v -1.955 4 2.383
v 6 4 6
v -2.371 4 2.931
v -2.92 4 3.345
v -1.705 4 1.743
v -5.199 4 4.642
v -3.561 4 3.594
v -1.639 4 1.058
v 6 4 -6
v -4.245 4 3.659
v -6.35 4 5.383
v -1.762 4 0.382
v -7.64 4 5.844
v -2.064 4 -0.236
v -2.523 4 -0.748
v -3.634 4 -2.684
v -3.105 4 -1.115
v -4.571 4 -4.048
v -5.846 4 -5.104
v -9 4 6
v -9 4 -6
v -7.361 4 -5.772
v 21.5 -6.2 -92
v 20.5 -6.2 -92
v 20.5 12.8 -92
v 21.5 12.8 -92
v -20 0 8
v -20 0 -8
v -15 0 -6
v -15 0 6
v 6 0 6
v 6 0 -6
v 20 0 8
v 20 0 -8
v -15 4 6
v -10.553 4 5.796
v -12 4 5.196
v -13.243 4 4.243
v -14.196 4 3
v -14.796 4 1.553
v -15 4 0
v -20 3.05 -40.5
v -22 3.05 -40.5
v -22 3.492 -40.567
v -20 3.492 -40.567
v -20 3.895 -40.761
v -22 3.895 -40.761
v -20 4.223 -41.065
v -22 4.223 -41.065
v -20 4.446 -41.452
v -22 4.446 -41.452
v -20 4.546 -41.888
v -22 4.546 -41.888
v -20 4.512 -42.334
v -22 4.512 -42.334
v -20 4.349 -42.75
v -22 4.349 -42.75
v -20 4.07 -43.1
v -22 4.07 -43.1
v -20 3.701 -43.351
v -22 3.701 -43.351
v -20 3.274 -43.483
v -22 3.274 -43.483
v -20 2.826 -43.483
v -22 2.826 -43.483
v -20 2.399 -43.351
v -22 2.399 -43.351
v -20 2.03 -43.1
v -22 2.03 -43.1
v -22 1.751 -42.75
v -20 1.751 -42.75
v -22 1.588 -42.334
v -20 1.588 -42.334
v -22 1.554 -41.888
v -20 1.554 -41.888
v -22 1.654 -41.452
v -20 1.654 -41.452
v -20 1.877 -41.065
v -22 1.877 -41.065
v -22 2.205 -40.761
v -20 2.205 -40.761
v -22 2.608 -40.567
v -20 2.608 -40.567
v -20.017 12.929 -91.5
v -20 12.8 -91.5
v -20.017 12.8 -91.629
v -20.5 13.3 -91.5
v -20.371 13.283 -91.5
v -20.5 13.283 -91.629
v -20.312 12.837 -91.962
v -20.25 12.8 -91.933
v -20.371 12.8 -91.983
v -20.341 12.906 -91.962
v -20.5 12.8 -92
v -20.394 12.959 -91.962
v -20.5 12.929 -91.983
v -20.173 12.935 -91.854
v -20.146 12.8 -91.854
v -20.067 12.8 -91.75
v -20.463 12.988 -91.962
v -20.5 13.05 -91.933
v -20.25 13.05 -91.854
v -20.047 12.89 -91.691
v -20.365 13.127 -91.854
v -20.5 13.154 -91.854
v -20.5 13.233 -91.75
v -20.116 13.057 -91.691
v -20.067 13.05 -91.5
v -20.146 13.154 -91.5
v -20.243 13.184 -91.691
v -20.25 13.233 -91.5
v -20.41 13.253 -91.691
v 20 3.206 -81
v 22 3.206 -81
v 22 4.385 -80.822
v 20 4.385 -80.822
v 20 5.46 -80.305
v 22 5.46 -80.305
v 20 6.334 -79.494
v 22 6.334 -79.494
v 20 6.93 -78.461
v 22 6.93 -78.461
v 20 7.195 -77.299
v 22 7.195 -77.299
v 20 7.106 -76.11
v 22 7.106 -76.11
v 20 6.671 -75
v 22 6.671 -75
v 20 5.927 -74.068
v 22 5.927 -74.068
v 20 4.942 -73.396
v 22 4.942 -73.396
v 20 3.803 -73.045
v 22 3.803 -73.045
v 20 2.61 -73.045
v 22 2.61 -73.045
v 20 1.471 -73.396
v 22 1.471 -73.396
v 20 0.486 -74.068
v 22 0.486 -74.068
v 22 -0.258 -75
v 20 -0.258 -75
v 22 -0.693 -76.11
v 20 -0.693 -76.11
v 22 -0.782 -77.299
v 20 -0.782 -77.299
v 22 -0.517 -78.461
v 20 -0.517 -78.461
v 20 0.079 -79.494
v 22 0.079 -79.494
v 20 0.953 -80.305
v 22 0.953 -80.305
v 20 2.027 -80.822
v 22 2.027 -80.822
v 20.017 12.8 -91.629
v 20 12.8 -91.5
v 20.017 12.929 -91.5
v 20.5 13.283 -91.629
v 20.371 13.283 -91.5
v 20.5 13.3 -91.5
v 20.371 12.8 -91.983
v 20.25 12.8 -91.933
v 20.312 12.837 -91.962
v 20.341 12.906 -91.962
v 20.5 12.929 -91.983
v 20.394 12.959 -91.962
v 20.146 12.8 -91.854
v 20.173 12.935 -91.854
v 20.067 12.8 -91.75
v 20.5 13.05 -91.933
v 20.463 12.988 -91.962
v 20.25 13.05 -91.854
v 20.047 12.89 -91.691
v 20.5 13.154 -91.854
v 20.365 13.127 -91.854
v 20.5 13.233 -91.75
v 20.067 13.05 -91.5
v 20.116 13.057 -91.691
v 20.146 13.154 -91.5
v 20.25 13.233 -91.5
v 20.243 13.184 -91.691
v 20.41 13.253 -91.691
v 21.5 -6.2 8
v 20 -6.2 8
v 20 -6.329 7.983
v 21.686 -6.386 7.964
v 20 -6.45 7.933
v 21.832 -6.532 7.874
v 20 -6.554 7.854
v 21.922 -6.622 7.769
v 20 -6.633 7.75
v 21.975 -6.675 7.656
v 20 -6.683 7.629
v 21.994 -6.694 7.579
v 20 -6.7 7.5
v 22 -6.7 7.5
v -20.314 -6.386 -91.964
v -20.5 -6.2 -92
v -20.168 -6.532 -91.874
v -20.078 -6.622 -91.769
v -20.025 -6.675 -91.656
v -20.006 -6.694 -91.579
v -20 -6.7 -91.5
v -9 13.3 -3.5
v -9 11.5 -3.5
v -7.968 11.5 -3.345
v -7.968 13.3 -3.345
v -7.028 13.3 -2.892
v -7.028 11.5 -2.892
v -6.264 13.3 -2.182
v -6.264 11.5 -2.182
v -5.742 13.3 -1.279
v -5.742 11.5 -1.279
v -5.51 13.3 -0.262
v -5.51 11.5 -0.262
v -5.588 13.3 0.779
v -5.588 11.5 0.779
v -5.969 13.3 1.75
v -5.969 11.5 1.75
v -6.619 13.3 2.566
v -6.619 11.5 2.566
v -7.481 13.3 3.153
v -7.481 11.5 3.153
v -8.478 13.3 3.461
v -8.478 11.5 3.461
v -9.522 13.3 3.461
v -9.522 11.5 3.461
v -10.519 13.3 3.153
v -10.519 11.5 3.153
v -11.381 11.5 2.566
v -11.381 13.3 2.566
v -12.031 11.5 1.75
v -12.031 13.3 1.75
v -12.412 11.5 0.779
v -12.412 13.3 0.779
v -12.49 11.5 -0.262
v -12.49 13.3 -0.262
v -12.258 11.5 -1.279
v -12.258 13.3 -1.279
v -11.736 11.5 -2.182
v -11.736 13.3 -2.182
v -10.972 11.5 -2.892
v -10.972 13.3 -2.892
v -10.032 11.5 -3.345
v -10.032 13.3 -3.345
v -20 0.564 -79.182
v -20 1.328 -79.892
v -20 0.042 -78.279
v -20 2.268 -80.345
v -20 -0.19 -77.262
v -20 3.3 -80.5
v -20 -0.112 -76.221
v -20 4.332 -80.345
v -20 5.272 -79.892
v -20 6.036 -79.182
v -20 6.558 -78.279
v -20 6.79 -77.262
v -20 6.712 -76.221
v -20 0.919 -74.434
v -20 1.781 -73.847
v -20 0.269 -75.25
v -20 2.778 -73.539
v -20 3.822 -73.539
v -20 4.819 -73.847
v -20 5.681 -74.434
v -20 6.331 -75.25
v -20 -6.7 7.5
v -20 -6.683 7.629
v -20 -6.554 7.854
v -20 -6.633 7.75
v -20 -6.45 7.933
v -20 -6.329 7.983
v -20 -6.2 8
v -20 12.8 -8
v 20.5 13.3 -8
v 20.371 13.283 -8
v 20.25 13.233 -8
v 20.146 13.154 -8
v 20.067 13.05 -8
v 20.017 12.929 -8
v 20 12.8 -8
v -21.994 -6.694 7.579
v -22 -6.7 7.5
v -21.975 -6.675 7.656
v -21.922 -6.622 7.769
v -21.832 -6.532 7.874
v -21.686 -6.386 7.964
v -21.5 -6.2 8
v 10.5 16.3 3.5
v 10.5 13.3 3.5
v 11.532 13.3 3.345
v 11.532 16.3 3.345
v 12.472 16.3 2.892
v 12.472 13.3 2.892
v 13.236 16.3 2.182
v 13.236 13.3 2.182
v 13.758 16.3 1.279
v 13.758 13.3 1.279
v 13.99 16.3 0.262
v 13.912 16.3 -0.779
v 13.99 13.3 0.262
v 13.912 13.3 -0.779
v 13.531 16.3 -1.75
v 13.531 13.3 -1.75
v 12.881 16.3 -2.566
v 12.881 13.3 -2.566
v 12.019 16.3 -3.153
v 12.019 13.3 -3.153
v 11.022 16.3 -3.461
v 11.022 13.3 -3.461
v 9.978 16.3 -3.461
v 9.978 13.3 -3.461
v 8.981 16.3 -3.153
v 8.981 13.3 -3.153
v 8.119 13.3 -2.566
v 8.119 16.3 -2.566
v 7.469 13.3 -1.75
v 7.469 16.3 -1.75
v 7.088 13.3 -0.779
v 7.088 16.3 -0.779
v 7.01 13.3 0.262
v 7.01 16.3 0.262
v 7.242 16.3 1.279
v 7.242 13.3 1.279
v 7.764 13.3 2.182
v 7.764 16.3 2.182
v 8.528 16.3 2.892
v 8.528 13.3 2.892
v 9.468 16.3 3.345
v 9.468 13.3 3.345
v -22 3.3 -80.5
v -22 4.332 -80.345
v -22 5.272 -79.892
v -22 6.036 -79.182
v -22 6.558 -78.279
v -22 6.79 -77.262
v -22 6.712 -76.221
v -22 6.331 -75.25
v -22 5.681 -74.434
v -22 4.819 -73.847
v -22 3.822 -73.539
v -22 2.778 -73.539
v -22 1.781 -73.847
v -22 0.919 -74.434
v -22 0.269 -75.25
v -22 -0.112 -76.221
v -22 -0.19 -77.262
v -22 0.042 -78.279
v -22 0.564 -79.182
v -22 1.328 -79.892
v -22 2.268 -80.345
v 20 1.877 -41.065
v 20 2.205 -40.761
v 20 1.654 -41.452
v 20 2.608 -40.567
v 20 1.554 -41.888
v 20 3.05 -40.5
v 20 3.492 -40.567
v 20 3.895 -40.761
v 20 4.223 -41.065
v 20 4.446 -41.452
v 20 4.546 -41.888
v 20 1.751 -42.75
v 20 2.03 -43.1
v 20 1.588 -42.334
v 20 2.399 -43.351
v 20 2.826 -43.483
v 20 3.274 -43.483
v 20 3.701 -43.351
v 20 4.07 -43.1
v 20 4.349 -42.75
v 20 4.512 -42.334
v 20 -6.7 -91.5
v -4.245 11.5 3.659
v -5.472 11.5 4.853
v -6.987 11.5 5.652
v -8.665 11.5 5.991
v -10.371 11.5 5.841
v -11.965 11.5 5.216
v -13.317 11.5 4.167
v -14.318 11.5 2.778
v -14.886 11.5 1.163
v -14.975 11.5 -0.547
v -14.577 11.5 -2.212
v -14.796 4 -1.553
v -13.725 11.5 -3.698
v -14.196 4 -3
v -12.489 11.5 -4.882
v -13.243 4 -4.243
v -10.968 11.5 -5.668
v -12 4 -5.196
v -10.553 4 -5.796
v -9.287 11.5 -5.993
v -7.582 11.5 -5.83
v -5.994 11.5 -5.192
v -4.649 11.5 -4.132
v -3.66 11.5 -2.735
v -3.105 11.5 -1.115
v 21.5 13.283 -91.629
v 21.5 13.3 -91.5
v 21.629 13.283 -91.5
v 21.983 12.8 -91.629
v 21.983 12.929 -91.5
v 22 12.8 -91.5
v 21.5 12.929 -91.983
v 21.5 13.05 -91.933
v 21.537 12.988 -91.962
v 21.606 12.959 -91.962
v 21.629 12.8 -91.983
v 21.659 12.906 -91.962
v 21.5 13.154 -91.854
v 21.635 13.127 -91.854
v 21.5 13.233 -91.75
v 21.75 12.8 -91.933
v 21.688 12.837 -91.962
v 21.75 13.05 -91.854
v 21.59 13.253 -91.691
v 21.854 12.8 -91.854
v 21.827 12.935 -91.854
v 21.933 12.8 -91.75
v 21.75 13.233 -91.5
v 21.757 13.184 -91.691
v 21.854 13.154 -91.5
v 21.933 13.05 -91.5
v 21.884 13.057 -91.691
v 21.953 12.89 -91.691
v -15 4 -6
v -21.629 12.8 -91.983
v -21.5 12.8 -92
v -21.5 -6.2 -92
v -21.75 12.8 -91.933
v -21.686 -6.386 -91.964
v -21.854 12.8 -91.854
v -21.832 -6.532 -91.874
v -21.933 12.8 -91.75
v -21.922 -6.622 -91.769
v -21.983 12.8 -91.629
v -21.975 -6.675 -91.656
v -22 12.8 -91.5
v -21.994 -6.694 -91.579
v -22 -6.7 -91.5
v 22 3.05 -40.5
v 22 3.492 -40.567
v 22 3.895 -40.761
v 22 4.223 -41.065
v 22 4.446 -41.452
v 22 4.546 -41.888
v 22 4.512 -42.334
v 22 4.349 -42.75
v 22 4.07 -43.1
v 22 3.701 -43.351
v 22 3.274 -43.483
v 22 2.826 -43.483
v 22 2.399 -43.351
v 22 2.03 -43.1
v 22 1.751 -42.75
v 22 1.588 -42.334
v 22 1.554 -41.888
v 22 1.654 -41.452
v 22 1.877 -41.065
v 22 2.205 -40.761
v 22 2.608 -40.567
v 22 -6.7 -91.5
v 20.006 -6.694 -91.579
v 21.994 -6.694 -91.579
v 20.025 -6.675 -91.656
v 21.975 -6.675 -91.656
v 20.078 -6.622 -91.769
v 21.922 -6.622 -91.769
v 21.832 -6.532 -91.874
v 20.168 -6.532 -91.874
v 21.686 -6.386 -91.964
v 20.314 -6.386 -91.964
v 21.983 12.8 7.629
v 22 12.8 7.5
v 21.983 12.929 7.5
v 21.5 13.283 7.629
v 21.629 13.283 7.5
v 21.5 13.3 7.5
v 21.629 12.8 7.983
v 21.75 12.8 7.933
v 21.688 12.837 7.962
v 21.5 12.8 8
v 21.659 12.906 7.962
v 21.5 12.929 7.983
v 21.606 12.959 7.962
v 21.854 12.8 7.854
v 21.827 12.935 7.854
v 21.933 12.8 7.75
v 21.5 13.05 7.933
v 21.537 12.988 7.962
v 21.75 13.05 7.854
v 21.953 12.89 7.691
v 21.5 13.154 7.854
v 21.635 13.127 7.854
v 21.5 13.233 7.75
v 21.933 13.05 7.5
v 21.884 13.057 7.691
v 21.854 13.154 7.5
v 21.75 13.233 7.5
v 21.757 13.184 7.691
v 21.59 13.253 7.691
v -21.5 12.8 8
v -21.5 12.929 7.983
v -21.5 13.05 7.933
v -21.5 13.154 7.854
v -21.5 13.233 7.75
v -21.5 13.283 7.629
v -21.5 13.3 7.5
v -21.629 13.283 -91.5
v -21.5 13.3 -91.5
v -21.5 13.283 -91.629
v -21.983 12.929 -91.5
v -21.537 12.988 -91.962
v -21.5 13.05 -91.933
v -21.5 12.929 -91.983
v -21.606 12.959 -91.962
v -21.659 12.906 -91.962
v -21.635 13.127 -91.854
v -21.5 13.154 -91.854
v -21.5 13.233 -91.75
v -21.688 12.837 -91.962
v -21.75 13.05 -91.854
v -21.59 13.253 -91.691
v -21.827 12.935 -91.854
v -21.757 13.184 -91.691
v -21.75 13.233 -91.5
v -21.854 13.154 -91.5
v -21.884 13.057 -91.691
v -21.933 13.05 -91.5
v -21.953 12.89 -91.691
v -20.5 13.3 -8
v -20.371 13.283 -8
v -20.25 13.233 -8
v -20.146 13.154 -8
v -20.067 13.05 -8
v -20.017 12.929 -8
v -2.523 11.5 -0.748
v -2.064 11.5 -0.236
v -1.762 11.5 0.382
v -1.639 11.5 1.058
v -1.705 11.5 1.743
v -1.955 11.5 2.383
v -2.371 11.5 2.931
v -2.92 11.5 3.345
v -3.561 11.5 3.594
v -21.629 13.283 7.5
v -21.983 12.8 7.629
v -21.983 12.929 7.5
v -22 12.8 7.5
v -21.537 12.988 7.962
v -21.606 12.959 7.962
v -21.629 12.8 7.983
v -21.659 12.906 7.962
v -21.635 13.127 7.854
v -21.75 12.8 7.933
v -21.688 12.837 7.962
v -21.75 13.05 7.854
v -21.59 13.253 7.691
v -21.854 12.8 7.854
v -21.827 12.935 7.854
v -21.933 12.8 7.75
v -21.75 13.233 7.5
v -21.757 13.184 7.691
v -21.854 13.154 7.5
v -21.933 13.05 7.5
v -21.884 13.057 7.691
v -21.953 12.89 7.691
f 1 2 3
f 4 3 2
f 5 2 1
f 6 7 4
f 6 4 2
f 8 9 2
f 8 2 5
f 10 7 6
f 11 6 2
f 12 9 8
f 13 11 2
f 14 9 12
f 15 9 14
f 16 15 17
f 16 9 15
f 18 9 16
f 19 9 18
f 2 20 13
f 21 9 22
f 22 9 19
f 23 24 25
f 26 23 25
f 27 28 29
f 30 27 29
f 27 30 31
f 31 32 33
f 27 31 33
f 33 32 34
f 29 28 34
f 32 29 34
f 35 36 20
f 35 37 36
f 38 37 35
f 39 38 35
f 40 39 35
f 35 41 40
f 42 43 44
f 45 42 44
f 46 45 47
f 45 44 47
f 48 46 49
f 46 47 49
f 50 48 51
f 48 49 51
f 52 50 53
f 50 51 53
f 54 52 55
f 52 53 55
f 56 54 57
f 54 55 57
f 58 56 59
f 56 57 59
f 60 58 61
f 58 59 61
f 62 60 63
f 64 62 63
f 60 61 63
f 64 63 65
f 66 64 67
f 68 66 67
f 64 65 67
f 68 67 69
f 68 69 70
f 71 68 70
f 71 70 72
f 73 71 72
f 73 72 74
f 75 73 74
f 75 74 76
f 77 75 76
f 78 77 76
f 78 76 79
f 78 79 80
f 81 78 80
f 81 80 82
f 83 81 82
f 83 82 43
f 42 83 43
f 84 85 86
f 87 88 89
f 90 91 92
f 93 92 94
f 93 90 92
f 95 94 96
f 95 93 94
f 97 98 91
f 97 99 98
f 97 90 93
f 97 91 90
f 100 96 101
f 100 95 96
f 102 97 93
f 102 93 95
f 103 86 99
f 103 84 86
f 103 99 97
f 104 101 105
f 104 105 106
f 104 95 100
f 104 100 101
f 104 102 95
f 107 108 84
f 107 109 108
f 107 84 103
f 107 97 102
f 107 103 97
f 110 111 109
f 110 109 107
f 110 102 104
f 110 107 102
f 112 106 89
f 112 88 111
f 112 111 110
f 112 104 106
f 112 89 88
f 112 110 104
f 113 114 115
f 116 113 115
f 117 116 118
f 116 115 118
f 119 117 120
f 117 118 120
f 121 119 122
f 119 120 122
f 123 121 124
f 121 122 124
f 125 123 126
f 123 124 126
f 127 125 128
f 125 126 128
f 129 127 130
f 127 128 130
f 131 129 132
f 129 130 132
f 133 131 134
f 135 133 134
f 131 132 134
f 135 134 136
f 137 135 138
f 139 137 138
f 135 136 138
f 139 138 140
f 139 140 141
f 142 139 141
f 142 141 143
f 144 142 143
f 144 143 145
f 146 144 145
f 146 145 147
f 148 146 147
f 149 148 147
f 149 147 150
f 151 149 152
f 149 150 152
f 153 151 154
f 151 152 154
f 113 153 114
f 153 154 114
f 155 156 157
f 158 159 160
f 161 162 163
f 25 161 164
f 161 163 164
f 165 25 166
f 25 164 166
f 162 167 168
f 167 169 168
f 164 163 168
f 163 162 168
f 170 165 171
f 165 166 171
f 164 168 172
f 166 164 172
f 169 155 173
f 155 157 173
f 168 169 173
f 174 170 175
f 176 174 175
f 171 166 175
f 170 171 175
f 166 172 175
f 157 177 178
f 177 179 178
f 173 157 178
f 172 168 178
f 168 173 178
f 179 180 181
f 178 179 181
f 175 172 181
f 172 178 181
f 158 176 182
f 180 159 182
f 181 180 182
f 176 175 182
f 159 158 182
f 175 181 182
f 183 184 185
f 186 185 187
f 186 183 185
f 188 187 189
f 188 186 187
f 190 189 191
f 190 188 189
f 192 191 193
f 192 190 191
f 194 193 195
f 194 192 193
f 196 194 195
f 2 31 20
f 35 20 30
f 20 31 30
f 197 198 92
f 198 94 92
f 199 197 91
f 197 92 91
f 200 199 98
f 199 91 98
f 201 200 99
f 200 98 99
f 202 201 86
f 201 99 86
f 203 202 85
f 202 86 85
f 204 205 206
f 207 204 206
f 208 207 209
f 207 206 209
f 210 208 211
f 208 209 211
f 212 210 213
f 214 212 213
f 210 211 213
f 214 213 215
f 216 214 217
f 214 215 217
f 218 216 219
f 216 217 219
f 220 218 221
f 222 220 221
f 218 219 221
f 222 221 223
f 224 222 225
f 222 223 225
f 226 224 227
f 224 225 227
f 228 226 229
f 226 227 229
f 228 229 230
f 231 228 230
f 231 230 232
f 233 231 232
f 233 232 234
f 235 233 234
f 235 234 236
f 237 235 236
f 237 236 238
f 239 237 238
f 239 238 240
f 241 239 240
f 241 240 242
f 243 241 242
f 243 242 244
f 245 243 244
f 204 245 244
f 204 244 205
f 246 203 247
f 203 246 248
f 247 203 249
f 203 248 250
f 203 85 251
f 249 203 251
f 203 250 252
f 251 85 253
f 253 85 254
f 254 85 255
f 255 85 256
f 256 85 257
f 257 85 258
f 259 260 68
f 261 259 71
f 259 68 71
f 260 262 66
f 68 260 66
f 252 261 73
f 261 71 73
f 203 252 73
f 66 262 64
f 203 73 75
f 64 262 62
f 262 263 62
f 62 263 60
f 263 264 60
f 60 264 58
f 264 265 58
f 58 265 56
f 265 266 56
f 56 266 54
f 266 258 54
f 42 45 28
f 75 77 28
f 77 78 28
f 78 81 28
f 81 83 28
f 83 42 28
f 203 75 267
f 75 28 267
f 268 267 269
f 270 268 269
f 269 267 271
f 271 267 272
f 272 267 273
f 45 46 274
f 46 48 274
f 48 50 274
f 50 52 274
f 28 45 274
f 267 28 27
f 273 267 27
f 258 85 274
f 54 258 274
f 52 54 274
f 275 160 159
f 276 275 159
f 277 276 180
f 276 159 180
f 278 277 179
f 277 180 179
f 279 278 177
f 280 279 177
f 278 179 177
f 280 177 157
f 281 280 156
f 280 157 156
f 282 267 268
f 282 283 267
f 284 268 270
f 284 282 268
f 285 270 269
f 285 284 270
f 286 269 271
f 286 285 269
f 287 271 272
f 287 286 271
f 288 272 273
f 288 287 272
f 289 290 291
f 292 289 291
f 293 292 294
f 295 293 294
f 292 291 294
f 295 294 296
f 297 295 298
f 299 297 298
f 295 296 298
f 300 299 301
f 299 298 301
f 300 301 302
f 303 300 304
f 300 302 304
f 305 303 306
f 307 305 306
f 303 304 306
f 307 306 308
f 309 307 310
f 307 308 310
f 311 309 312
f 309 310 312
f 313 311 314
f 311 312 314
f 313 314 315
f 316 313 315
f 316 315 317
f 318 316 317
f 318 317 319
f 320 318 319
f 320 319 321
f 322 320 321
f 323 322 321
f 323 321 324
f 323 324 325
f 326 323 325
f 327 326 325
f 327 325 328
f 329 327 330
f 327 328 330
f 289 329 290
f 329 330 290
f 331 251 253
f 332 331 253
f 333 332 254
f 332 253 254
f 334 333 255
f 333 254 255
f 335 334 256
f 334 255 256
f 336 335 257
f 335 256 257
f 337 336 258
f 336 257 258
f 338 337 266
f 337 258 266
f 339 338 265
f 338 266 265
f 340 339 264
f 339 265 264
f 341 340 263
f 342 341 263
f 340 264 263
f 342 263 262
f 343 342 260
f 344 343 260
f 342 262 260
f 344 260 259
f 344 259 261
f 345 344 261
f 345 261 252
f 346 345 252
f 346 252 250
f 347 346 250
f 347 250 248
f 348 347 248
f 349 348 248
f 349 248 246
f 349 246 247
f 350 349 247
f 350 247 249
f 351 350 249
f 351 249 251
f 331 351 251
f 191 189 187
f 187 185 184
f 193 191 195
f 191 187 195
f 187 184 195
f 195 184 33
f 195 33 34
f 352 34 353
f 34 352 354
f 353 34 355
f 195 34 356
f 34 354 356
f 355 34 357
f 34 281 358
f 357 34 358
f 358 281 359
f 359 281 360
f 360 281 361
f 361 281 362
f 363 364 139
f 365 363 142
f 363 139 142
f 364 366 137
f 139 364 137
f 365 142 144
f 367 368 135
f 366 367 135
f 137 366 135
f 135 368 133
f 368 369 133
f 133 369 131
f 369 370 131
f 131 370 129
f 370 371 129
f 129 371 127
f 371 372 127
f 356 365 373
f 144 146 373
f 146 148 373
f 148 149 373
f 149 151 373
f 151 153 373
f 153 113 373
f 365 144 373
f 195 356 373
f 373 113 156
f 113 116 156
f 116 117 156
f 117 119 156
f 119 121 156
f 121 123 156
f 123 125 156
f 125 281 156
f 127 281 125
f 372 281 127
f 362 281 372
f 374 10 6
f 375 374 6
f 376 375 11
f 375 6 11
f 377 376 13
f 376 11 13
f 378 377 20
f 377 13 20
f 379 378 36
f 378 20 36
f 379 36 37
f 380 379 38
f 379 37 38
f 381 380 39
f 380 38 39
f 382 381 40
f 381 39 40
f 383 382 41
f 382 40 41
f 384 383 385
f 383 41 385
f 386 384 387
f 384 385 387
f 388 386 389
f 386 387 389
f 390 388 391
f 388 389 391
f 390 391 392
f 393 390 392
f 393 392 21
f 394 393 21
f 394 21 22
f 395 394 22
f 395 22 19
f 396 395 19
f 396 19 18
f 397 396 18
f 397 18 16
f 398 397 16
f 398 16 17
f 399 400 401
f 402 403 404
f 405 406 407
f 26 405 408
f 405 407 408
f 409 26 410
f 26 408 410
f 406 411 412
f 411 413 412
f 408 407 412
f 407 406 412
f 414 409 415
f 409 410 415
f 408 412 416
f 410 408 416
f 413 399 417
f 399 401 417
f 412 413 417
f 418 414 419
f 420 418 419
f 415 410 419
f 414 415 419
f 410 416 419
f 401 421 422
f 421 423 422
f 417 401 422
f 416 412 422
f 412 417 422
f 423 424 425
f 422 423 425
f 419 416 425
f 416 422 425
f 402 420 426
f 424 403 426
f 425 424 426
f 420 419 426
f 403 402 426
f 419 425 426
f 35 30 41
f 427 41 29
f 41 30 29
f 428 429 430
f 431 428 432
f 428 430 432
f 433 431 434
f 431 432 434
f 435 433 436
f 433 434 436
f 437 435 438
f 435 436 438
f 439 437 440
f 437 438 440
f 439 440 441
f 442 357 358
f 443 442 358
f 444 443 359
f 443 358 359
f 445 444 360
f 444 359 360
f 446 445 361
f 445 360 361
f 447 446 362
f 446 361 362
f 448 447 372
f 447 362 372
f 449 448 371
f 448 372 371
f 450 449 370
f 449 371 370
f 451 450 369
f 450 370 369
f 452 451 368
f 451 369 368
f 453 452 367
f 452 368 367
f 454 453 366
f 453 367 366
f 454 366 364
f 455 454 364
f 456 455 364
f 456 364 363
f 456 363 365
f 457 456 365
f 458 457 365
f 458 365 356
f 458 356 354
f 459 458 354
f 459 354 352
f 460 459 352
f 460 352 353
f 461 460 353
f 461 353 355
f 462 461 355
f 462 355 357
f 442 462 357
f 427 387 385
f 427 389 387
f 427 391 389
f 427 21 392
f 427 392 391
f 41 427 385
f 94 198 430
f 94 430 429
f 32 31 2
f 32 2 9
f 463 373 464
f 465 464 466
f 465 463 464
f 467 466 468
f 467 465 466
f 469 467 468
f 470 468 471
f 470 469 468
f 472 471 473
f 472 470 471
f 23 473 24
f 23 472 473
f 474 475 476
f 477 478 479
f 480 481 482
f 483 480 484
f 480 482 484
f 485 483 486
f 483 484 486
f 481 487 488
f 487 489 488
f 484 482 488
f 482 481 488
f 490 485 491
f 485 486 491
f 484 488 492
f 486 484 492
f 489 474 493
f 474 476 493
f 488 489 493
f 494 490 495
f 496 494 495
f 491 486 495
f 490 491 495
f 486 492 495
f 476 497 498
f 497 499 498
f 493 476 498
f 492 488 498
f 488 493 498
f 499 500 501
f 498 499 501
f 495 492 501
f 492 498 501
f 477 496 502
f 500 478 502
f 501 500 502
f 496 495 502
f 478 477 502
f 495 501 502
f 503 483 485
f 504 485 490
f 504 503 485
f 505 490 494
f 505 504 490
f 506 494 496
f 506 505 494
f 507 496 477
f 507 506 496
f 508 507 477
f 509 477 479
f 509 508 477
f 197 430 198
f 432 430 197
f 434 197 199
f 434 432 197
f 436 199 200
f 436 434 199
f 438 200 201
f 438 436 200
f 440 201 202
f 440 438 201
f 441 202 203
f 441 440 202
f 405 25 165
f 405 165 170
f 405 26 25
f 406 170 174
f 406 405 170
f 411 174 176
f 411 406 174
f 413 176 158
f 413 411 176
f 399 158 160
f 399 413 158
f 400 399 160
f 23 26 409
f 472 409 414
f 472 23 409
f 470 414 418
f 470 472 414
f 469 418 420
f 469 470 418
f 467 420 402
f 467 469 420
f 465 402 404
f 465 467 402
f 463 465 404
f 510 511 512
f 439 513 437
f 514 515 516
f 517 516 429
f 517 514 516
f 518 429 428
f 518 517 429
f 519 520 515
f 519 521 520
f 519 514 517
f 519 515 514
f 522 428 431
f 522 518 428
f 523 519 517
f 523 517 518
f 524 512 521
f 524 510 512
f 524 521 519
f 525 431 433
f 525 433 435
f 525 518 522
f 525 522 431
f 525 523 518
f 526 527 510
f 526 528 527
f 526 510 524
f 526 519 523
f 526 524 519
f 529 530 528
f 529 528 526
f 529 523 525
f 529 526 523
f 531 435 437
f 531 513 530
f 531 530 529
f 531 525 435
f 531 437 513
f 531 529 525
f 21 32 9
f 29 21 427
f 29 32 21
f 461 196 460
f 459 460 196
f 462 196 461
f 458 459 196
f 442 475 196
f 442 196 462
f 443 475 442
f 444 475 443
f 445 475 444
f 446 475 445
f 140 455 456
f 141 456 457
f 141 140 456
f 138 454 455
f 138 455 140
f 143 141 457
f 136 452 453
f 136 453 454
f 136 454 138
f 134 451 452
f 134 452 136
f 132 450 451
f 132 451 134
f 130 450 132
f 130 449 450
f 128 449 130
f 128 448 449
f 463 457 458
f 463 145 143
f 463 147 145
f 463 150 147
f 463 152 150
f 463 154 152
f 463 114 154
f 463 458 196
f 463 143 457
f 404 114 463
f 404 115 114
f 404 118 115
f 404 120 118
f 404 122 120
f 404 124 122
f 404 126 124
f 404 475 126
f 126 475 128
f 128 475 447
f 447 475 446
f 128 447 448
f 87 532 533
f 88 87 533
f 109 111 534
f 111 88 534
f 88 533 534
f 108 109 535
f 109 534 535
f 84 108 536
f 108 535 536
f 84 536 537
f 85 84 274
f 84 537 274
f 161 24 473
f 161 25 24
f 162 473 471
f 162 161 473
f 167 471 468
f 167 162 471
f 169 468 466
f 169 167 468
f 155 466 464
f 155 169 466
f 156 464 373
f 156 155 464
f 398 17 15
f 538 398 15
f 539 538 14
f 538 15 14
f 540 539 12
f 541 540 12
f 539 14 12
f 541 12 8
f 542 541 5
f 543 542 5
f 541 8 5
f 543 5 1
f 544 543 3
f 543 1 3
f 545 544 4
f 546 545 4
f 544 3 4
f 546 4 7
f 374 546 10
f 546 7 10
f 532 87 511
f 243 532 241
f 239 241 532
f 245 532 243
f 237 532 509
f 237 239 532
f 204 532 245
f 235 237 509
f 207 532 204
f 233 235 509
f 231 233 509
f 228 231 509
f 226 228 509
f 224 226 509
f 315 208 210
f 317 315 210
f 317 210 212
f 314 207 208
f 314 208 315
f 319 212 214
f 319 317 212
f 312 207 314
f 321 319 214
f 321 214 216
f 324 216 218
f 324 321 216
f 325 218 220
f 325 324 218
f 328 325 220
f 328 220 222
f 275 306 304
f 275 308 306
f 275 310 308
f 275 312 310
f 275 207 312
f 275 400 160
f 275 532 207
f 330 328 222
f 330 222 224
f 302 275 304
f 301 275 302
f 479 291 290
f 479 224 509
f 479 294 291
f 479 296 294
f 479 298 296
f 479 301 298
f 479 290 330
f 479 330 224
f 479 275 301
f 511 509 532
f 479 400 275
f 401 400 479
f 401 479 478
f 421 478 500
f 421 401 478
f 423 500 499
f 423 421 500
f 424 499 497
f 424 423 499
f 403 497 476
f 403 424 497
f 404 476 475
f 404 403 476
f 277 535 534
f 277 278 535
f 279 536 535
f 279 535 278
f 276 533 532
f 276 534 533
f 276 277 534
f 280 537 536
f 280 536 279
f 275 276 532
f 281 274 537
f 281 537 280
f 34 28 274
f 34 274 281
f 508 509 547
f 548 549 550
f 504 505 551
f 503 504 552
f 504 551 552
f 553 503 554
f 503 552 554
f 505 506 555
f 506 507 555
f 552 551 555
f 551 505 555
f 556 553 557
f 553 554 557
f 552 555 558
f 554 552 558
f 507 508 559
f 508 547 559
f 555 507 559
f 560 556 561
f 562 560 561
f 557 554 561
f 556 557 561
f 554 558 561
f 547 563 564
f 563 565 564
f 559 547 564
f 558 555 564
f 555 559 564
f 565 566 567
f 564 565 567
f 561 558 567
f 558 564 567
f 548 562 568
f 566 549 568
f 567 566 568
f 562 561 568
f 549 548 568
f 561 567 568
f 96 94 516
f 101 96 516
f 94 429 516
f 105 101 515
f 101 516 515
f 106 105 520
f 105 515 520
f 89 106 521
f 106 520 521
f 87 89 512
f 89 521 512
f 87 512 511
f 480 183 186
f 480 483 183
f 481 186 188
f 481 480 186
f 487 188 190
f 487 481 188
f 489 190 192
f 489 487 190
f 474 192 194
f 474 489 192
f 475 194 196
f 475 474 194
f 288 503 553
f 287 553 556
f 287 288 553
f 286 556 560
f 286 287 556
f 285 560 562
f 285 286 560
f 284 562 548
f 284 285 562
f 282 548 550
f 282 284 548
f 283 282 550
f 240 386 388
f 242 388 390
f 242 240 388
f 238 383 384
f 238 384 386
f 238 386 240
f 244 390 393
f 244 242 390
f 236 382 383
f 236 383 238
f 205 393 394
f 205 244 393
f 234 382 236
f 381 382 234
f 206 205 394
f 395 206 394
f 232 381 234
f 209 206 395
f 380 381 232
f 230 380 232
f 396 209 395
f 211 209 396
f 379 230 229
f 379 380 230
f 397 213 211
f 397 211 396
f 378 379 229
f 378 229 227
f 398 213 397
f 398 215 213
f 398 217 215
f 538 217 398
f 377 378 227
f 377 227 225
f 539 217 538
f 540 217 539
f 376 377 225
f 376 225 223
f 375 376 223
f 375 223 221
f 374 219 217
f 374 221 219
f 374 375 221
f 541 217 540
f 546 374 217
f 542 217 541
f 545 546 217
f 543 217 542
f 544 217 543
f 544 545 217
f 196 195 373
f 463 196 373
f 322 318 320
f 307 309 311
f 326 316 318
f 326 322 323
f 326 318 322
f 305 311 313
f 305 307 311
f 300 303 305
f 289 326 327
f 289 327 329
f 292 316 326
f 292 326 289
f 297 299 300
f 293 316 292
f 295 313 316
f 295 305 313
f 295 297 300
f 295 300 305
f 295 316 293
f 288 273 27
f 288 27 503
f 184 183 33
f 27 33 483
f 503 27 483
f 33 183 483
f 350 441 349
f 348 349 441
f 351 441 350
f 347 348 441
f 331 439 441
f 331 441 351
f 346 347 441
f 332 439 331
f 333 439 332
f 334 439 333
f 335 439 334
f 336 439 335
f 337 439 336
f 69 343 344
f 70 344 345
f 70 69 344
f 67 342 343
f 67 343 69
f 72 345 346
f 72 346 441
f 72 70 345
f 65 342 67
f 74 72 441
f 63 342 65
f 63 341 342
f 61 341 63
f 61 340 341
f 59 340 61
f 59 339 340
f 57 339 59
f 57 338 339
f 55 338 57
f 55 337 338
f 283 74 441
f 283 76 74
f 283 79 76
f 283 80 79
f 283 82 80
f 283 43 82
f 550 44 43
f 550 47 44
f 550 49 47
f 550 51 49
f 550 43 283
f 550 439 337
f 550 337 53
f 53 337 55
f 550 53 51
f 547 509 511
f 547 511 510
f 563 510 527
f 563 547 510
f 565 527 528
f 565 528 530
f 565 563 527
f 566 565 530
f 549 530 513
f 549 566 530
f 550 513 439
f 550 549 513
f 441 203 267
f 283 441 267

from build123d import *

# Parameters (mm, degrees)
SKETCH1_W           = 40
SKETCH1_H           = 16
BOSS_EXTRUDE1_DEPTH = 13.3
CUT_EXTRUDE2_DEPTH  = 11.5
SKETCH3_R           = 3.5
CUT_EXTRUDE3_DEPTH  = 24.8
SKETCH4_W           = 21
SKETCH4_H           = 12
CUT_EXTRUDE4_DEPTH  = 4
SKETCH5_W           = 100
SKETCH5_H           = 20
BOSS_EXTRUDE2_DEPTH = 2
SKETCH6_W           = 100
SKETCH6_H           = 20
BOSS_EXTRUDE3_DEPTH = 2
SKETCH7_R           = 4
CUT_EXTRUDE5_DEPTH  = 2
CUT_EXTRUDE8_REACH  = 104.004
SKETCH8_R           = 3.5
FILLET1_R           = 0.5
FILLET2_R           = 0.5
SKETCH9_R           = 3.5
BOSS_EXTRUDE4_DEPTH = 3
SKETCH10_R          = 1.5
CUT_EXTRUDE9_DEPTH  = 104.274827523


with BuildPart() as part:
    # Sketch1 → Boss-Extrude1 (new body)
    with BuildSketch(Plane(origin=(0, 0, 0), x_dir=(1, 0, 0), z_dir=(0, 1, 0))):
        Rectangle(SKETCH1_W, SKETCH1_H)
    extrude(amount=BOSS_EXTRUDE1_DEPTH)

    # Sketch2 → Cut-Extrude2 (cut)
    with BuildSketch(Plane.XZ):
        with BuildLine():
            ThreePointArc((-4.245094519, 3.659354296), (-14.835807847, -1.394039732), (-3.104556161, -1.115231786))
            ThreePointArc((-3.104556161, -1.115231786), (-1.705240191, 1.742549665), (-4.245094519, 3.659354296))
        make_face()
    extrude(amount=-CUT_EXTRUDE2_DEPTH, mode=Mode.SUBTRACT)

    # Sketch3 → Cut-Extrude3 (cut)
    with BuildSketch(Plane(origin=(0, 0, 0), x_dir=(-1, 0, 0), z_dir=(0, -1, 0))):
        with Locations(Location((9, 0, 0), (0, 0, 90))):
            Circle(SKETCH3_R)
    extrude(amount=-CUT_EXTRUDE3_DEPTH, mode=Mode.SUBTRACT)

    # Sketch4 → Cut-Extrude4 (cut)
    with BuildSketch(Plane(origin=(0, 0, 0), x_dir=(-1, 0, 0), z_dir=(0, -1, 0))):
        with Locations((4.5, 0)):
            Rectangle(SKETCH4_W, SKETCH4_H)
    extrude(amount=-CUT_EXTRUDE4_DEPTH, mode=Mode.SUBTRACT)

    # Sketch5 → Boss-Extrude2 (add)
    with BuildSketch(Plane(origin=(20, 0, 0), x_dir=(0, 0, -1), z_dir=(1, 0, 0))):
        with Locations((42, 3.3)):
            Rectangle(SKETCH5_W, SKETCH5_H)
    extrude(amount=BOSS_EXTRUDE2_DEPTH)

    # Sketch6 → Boss-Extrude3 (add)
    with BuildSketch(Plane.ZY.offset(20)):
        with Locations((-42, 3.3)):
            Rectangle(SKETCH6_W, SKETCH6_H)
    extrude(amount=BOSS_EXTRUDE3_DEPTH)

    # Sketch7 → Cut-Extrude5 (cut)
    with BuildSketch(Plane(origin=(22, 0, 0), x_dir=(0, 0, -1), z_dir=(1, 0, 0))):
        with Locations((77, 3.206448438)):
            Circle(SKETCH7_R)
    extrude(amount=-CUT_EXTRUDE5_DEPTH, mode=Mode.SUBTRACT)

    # Sketch8 → Cut-Extrude8 (cut, up to next)
    with BuildSketch(Plane(origin=(-20, 0, 0), x_dir=(0, 0, -1), z_dir=(1, 0, 0)), mode=Mode.PRIVATE) as cut_extrude8_sk1:
        with Locations((77, 3.3)):
            Circle(SKETCH8_R)
    cut_extrude8_tool1 = extrude(cut_extrude8_sk1.sketch, amount=-CUT_EXTRUDE8_REACH, mode=Mode.PRIVATE) & part.part
    add(cut_extrude8_tool1.solids().sort_by_distance((-20, 3.3, -77))[0], mode=Mode.SUBTRACT)

    # Fillet1
    fillet1_edges = [part.edges().sort_by_distance(p)[0] for p in [
        (20, 13.3, -50),
        (22, 13.3, -42),
        (-20, 13.3, -50),
        (-22, 13.3, -42),
    ]]
    fillet(fillet1_edges, radius=FILLET1_R)

    # Fillet2
    fillet2_edges = [part.edges().sort_by_distance(p)[0] for p in [
        (21.853553391, 13.153553391, -92),
        (20.146446609, 13.153553391, -92),
        (-20, 3.05, -92),
        (-22, 3.05, -92),
        (-21.853553391, 13.153553391, -92),
        (-20.146446609, 13.153553391, -92),
        (22, 3.05, 8),
        (21.853553391, 13.153553391, 8),
        (-21.853553391, 13.153553391, 8),
        (21, -6.7, 8),
        (20, 3.05, -92),
        (21, -6.7, -92),
        (22, 3.05, -92),
        (-21, -6.7, 8),
        (-21, -6.7, -92),
        (-22, 3.05, 8),
        (0, 13.3, 8),
        (21, 13.3, -92),
        (-21, 13.3, -92),
    ]]
    fillet(fillet2_edges, radius=FILLET2_R)

    # Sketch9 → Boss-Extrude4 (add)
    with BuildSketch(Plane(origin=(0, 13.3, 0), x_dir=(1, 0, 0), z_dir=(0, 1, 0))):
        with Locations(Location((10.5, 0, 0), (0, 0, 270))):
            Circle(SKETCH9_R)
    extrude(amount=BOSS_EXTRUDE4_DEPTH)

    # Sketch10 → Cut-Extrude9 (cut, through all)
    with BuildSketch(Plane.ZY.offset(22)):
        with Locations((-42, 3.05)):
            Circle(SKETCH10_R)
    extrude(amount=-CUT_EXTRUDE9_DEPTH, mode=Mode.SUBTRACT)


solid = part.part
